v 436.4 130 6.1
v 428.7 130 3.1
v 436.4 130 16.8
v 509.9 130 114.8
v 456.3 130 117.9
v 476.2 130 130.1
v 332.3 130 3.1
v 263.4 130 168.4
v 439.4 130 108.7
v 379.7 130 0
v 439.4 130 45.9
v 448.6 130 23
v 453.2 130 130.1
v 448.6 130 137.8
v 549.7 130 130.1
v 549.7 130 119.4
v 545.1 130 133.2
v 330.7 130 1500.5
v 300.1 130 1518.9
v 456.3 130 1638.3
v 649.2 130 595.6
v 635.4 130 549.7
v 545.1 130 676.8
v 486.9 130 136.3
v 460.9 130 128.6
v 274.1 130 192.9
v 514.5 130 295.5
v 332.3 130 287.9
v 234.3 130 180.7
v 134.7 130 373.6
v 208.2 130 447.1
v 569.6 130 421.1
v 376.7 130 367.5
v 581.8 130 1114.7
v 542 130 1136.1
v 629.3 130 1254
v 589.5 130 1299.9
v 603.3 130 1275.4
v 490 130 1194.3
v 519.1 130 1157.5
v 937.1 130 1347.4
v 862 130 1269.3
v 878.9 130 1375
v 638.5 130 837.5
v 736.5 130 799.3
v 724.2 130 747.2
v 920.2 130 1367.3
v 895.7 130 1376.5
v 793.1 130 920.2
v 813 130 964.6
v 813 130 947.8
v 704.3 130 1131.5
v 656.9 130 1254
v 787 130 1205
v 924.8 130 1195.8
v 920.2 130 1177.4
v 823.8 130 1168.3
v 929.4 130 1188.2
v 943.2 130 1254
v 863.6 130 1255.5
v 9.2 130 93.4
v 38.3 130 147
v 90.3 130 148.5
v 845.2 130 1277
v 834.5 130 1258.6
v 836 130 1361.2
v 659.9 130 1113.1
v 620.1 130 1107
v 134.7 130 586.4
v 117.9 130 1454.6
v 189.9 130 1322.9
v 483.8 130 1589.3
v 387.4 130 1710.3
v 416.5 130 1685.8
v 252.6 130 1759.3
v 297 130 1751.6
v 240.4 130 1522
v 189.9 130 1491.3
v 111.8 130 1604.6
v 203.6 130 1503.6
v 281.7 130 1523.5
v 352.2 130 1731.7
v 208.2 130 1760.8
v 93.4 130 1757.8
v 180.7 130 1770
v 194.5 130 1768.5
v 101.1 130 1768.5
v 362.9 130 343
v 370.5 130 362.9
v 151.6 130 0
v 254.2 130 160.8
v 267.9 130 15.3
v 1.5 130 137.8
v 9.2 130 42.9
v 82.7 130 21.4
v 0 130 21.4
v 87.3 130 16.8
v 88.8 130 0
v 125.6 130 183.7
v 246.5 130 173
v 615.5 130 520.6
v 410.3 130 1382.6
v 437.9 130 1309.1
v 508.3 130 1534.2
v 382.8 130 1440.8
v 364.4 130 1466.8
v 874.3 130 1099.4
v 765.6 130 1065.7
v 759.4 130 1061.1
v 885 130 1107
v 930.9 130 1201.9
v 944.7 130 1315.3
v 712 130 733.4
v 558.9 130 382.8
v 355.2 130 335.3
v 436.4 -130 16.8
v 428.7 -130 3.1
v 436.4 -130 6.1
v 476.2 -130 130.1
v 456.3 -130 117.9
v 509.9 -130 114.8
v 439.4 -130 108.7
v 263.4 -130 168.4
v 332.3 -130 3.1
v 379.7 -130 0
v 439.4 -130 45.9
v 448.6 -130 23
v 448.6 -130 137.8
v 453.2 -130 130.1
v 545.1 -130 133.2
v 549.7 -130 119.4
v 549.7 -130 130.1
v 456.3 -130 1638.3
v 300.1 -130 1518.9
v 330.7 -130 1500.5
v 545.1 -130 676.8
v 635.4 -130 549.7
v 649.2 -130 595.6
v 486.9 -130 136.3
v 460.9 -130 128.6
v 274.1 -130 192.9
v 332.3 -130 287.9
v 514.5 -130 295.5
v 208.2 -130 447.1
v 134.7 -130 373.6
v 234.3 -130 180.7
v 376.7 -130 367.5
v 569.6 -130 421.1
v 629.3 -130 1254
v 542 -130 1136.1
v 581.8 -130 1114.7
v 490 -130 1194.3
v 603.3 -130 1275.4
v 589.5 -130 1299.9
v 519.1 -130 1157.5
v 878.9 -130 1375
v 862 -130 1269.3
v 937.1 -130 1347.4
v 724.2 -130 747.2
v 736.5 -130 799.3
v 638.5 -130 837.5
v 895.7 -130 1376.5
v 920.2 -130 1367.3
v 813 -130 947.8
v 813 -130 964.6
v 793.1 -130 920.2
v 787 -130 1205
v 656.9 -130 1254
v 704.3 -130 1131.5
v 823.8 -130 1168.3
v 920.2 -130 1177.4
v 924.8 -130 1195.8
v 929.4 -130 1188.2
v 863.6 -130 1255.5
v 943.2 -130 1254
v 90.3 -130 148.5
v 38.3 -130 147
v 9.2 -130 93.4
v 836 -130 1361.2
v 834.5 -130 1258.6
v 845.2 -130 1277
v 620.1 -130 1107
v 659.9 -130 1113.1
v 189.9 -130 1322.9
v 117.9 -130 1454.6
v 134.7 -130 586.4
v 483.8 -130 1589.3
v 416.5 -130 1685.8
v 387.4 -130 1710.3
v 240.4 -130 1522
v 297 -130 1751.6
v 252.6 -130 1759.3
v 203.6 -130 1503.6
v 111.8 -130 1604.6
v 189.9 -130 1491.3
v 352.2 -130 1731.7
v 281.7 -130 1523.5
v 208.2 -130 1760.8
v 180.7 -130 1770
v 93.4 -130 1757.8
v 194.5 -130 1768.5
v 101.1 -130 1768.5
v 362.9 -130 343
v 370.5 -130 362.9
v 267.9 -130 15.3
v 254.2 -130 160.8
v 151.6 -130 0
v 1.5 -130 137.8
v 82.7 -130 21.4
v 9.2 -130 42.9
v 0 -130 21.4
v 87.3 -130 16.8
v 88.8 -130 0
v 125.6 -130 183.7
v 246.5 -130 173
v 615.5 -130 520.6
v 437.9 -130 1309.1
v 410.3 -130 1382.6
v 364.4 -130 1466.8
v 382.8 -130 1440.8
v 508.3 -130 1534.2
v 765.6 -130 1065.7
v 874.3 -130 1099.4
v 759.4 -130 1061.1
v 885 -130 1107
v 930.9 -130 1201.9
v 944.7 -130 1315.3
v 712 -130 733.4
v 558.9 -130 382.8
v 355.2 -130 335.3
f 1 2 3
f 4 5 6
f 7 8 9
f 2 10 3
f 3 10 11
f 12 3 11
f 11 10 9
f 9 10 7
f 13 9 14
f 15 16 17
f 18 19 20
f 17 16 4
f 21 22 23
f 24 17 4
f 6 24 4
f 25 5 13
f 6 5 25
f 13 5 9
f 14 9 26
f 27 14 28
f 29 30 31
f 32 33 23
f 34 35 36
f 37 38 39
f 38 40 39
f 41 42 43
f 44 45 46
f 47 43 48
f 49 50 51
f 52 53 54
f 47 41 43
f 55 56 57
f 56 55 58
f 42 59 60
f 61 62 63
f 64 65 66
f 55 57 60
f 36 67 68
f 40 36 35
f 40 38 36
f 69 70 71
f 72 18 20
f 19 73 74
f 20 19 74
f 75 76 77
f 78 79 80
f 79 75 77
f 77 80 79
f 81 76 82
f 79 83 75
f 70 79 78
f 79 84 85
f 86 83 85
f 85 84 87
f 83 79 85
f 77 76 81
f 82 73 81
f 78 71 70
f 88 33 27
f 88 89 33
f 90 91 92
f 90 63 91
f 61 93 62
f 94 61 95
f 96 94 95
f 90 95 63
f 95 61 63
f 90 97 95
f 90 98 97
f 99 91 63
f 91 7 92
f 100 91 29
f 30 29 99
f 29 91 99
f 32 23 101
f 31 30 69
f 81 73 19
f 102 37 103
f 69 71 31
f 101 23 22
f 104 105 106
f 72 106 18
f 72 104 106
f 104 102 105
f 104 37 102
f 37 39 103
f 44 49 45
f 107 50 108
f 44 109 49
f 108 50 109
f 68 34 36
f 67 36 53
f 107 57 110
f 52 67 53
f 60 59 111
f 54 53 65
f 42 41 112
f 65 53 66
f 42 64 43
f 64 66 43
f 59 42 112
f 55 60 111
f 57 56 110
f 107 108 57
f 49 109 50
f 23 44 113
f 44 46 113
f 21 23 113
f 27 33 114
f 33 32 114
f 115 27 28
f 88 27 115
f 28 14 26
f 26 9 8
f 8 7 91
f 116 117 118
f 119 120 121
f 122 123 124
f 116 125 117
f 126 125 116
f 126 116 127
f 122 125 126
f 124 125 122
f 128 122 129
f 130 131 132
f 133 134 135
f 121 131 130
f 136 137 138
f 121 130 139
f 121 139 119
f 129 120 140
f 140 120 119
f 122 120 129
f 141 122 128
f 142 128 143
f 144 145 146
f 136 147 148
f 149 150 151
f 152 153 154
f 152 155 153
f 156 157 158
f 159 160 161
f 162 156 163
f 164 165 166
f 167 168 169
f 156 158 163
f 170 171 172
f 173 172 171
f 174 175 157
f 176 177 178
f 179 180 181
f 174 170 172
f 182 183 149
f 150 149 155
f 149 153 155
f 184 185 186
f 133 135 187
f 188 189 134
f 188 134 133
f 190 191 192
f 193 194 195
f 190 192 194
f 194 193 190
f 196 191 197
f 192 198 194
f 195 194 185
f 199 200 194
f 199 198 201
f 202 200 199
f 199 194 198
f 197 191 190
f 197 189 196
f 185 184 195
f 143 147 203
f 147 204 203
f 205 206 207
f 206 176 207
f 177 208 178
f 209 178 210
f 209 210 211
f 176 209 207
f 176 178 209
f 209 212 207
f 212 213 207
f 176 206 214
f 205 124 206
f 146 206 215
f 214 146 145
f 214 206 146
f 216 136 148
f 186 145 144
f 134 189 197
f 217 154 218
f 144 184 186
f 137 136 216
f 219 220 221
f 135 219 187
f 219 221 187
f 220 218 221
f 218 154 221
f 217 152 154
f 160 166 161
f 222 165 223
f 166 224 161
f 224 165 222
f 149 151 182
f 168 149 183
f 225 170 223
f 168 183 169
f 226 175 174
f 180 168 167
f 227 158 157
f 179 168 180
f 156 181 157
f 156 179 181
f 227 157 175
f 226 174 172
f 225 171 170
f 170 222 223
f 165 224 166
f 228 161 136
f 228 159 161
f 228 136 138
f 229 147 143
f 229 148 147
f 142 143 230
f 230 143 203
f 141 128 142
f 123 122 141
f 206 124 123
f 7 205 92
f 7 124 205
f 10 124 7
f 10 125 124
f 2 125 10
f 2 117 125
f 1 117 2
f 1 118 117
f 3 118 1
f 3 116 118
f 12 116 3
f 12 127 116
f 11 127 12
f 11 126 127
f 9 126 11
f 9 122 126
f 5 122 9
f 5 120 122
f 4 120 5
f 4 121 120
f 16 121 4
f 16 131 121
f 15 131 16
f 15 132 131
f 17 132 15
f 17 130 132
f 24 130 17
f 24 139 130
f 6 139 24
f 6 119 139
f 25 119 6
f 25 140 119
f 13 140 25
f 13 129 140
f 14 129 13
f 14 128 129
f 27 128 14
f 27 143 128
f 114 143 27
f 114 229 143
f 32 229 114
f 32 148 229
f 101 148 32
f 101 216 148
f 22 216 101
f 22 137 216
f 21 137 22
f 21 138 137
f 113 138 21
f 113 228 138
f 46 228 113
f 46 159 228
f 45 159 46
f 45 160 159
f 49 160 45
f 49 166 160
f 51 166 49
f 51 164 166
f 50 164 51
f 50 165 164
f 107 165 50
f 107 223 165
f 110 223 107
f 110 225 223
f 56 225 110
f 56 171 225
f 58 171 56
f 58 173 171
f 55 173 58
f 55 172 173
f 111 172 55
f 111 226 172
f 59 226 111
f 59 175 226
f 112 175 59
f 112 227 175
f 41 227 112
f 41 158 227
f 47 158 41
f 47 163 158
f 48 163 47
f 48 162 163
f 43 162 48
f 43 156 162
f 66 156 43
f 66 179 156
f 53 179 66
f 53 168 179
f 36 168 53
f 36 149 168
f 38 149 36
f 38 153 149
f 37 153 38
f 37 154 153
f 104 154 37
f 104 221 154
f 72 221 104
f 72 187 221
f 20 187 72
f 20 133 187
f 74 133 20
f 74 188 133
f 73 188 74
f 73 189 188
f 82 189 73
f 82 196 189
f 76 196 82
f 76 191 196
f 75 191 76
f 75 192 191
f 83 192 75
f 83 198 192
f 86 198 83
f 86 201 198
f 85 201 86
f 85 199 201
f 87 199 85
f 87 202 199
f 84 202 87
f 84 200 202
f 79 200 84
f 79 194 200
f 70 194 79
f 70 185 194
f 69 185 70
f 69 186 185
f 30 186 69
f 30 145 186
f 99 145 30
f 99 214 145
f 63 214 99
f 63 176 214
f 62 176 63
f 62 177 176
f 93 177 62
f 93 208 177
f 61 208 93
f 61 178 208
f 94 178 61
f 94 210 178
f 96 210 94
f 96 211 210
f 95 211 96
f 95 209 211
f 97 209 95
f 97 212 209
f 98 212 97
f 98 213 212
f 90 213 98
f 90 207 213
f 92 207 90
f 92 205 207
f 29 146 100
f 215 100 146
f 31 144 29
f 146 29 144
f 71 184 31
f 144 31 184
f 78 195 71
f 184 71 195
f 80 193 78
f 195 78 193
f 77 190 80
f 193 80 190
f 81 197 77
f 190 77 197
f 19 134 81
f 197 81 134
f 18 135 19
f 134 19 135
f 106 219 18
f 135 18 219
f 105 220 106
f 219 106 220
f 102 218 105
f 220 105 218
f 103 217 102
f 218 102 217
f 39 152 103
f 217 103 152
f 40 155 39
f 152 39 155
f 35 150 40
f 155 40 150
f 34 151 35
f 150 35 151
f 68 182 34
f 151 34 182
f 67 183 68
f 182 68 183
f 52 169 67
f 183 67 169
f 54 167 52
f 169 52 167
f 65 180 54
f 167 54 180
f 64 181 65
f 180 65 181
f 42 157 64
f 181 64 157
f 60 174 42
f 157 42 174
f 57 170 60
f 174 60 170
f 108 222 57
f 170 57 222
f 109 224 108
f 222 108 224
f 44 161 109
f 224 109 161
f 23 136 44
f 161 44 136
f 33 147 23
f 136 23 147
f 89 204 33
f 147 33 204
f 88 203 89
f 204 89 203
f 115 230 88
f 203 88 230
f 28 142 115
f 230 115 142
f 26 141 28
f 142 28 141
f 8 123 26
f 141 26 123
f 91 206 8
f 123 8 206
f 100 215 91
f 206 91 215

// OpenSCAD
// harp_traced.scad -- FAITHFUL side profile traced from the real harp
// (broadside silhouette of the Sketchfab model, scaled to 1770 mm tall).
// The 2D outline below is the actual harp outline, extruded to depth.
depth = 260;       // mm front-back thickness of the slab (set your soundbox depth)
$fn=24;
module profile() {
  difference() {
    polygon(points=[[101.1,1768.5],[93.4,1757.8],[111.8,1604.6],[117.9,1454.6],[134.7,586.4],[134.7,373.6],[125.6,183.7],[90.3,148.5],[38.3,147.0],[1.5,137.8],[9.2,93.4],[9.2,42.9],[0.0,21.4],[82.7,21.4],[87.3,16.8],[88.8,0.0],[151.6,0.0],[267.9,15.3],[332.3,3.1],[379.7,0.0],[428.7,3.1],[436.4,6.1],[436.4,16.8],[448.6,23.0],[439.4,45.9],[439.4,108.7],[456.3,117.9],[509.9,114.8],[549.7,119.4],[549.7,130.1],[545.1,133.2],[486.9,136.3],[476.2,130.1],[460.9,128.6],[453.2,130.1],[448.6,137.8],[514.5,295.5],[558.9,382.8],[569.6,421.1],[615.5,520.6],[635.4,549.7],[649.2,595.6],[712.0,733.4],[724.2,747.2],[736.5,799.3],[793.1,920.2],[813.0,947.8],[813.0,964.6],[874.3,1099.4],[885.0,1107.0],[920.2,1177.4],[929.4,1188.2],[924.8,1195.8],[930.9,1201.9],[943.2,1254.0],[944.7,1315.3],[937.1,1347.4],[920.2,1367.3],[895.7,1376.5],[878.9,1375.0],[836.0,1361.2],[656.9,1254.0],[629.3,1254.0],[603.3,1275.4],[589.5,1299.9],[508.3,1534.2],[483.8,1589.3],[456.3,1638.3],[416.5,1685.8],[387.4,1710.3],[352.2,1731.7],[297.0,1751.6],[252.6,1759.3],[208.2,1760.8],[194.5,1768.5],[180.7,1770.0]]);
    polygon(points=[[281.7,1523.5],[300.1,1518.9],[330.7,1500.5],[364.4,1466.8],[382.8,1440.8],[410.3,1382.6],[437.9,1309.1],[490.0,1194.3],[519.1,1157.5],[542.0,1136.1],[581.8,1114.7],[620.1,1107.0],[659.9,1113.1],[704.3,1131.5],[787.0,1205.0],[834.5,1258.6],[845.2,1277.0],[862.0,1269.3],[863.6,1255.5],[823.8,1168.3],[765.6,1065.7],[759.4,1061.1],[638.5,837.5],[545.1,676.8],[376.7,367.5],[370.5,362.9],[362.9,343.0],[355.2,335.3],[332.3,287.9],[274.1,192.9],[263.4,168.4],[254.2,160.8],[246.5,173.0],[234.3,180.7],[208.2,447.1],[189.9,1322.9],[189.9,1491.3],[203.6,1503.6],[240.4,1522.0]]);
  }
}
// stand it up: profile is in X(front-back) - Y(height); extrude gives Z = width
rotate([90,0,0]) linear_extrude(height=depth, center=true) profile();
